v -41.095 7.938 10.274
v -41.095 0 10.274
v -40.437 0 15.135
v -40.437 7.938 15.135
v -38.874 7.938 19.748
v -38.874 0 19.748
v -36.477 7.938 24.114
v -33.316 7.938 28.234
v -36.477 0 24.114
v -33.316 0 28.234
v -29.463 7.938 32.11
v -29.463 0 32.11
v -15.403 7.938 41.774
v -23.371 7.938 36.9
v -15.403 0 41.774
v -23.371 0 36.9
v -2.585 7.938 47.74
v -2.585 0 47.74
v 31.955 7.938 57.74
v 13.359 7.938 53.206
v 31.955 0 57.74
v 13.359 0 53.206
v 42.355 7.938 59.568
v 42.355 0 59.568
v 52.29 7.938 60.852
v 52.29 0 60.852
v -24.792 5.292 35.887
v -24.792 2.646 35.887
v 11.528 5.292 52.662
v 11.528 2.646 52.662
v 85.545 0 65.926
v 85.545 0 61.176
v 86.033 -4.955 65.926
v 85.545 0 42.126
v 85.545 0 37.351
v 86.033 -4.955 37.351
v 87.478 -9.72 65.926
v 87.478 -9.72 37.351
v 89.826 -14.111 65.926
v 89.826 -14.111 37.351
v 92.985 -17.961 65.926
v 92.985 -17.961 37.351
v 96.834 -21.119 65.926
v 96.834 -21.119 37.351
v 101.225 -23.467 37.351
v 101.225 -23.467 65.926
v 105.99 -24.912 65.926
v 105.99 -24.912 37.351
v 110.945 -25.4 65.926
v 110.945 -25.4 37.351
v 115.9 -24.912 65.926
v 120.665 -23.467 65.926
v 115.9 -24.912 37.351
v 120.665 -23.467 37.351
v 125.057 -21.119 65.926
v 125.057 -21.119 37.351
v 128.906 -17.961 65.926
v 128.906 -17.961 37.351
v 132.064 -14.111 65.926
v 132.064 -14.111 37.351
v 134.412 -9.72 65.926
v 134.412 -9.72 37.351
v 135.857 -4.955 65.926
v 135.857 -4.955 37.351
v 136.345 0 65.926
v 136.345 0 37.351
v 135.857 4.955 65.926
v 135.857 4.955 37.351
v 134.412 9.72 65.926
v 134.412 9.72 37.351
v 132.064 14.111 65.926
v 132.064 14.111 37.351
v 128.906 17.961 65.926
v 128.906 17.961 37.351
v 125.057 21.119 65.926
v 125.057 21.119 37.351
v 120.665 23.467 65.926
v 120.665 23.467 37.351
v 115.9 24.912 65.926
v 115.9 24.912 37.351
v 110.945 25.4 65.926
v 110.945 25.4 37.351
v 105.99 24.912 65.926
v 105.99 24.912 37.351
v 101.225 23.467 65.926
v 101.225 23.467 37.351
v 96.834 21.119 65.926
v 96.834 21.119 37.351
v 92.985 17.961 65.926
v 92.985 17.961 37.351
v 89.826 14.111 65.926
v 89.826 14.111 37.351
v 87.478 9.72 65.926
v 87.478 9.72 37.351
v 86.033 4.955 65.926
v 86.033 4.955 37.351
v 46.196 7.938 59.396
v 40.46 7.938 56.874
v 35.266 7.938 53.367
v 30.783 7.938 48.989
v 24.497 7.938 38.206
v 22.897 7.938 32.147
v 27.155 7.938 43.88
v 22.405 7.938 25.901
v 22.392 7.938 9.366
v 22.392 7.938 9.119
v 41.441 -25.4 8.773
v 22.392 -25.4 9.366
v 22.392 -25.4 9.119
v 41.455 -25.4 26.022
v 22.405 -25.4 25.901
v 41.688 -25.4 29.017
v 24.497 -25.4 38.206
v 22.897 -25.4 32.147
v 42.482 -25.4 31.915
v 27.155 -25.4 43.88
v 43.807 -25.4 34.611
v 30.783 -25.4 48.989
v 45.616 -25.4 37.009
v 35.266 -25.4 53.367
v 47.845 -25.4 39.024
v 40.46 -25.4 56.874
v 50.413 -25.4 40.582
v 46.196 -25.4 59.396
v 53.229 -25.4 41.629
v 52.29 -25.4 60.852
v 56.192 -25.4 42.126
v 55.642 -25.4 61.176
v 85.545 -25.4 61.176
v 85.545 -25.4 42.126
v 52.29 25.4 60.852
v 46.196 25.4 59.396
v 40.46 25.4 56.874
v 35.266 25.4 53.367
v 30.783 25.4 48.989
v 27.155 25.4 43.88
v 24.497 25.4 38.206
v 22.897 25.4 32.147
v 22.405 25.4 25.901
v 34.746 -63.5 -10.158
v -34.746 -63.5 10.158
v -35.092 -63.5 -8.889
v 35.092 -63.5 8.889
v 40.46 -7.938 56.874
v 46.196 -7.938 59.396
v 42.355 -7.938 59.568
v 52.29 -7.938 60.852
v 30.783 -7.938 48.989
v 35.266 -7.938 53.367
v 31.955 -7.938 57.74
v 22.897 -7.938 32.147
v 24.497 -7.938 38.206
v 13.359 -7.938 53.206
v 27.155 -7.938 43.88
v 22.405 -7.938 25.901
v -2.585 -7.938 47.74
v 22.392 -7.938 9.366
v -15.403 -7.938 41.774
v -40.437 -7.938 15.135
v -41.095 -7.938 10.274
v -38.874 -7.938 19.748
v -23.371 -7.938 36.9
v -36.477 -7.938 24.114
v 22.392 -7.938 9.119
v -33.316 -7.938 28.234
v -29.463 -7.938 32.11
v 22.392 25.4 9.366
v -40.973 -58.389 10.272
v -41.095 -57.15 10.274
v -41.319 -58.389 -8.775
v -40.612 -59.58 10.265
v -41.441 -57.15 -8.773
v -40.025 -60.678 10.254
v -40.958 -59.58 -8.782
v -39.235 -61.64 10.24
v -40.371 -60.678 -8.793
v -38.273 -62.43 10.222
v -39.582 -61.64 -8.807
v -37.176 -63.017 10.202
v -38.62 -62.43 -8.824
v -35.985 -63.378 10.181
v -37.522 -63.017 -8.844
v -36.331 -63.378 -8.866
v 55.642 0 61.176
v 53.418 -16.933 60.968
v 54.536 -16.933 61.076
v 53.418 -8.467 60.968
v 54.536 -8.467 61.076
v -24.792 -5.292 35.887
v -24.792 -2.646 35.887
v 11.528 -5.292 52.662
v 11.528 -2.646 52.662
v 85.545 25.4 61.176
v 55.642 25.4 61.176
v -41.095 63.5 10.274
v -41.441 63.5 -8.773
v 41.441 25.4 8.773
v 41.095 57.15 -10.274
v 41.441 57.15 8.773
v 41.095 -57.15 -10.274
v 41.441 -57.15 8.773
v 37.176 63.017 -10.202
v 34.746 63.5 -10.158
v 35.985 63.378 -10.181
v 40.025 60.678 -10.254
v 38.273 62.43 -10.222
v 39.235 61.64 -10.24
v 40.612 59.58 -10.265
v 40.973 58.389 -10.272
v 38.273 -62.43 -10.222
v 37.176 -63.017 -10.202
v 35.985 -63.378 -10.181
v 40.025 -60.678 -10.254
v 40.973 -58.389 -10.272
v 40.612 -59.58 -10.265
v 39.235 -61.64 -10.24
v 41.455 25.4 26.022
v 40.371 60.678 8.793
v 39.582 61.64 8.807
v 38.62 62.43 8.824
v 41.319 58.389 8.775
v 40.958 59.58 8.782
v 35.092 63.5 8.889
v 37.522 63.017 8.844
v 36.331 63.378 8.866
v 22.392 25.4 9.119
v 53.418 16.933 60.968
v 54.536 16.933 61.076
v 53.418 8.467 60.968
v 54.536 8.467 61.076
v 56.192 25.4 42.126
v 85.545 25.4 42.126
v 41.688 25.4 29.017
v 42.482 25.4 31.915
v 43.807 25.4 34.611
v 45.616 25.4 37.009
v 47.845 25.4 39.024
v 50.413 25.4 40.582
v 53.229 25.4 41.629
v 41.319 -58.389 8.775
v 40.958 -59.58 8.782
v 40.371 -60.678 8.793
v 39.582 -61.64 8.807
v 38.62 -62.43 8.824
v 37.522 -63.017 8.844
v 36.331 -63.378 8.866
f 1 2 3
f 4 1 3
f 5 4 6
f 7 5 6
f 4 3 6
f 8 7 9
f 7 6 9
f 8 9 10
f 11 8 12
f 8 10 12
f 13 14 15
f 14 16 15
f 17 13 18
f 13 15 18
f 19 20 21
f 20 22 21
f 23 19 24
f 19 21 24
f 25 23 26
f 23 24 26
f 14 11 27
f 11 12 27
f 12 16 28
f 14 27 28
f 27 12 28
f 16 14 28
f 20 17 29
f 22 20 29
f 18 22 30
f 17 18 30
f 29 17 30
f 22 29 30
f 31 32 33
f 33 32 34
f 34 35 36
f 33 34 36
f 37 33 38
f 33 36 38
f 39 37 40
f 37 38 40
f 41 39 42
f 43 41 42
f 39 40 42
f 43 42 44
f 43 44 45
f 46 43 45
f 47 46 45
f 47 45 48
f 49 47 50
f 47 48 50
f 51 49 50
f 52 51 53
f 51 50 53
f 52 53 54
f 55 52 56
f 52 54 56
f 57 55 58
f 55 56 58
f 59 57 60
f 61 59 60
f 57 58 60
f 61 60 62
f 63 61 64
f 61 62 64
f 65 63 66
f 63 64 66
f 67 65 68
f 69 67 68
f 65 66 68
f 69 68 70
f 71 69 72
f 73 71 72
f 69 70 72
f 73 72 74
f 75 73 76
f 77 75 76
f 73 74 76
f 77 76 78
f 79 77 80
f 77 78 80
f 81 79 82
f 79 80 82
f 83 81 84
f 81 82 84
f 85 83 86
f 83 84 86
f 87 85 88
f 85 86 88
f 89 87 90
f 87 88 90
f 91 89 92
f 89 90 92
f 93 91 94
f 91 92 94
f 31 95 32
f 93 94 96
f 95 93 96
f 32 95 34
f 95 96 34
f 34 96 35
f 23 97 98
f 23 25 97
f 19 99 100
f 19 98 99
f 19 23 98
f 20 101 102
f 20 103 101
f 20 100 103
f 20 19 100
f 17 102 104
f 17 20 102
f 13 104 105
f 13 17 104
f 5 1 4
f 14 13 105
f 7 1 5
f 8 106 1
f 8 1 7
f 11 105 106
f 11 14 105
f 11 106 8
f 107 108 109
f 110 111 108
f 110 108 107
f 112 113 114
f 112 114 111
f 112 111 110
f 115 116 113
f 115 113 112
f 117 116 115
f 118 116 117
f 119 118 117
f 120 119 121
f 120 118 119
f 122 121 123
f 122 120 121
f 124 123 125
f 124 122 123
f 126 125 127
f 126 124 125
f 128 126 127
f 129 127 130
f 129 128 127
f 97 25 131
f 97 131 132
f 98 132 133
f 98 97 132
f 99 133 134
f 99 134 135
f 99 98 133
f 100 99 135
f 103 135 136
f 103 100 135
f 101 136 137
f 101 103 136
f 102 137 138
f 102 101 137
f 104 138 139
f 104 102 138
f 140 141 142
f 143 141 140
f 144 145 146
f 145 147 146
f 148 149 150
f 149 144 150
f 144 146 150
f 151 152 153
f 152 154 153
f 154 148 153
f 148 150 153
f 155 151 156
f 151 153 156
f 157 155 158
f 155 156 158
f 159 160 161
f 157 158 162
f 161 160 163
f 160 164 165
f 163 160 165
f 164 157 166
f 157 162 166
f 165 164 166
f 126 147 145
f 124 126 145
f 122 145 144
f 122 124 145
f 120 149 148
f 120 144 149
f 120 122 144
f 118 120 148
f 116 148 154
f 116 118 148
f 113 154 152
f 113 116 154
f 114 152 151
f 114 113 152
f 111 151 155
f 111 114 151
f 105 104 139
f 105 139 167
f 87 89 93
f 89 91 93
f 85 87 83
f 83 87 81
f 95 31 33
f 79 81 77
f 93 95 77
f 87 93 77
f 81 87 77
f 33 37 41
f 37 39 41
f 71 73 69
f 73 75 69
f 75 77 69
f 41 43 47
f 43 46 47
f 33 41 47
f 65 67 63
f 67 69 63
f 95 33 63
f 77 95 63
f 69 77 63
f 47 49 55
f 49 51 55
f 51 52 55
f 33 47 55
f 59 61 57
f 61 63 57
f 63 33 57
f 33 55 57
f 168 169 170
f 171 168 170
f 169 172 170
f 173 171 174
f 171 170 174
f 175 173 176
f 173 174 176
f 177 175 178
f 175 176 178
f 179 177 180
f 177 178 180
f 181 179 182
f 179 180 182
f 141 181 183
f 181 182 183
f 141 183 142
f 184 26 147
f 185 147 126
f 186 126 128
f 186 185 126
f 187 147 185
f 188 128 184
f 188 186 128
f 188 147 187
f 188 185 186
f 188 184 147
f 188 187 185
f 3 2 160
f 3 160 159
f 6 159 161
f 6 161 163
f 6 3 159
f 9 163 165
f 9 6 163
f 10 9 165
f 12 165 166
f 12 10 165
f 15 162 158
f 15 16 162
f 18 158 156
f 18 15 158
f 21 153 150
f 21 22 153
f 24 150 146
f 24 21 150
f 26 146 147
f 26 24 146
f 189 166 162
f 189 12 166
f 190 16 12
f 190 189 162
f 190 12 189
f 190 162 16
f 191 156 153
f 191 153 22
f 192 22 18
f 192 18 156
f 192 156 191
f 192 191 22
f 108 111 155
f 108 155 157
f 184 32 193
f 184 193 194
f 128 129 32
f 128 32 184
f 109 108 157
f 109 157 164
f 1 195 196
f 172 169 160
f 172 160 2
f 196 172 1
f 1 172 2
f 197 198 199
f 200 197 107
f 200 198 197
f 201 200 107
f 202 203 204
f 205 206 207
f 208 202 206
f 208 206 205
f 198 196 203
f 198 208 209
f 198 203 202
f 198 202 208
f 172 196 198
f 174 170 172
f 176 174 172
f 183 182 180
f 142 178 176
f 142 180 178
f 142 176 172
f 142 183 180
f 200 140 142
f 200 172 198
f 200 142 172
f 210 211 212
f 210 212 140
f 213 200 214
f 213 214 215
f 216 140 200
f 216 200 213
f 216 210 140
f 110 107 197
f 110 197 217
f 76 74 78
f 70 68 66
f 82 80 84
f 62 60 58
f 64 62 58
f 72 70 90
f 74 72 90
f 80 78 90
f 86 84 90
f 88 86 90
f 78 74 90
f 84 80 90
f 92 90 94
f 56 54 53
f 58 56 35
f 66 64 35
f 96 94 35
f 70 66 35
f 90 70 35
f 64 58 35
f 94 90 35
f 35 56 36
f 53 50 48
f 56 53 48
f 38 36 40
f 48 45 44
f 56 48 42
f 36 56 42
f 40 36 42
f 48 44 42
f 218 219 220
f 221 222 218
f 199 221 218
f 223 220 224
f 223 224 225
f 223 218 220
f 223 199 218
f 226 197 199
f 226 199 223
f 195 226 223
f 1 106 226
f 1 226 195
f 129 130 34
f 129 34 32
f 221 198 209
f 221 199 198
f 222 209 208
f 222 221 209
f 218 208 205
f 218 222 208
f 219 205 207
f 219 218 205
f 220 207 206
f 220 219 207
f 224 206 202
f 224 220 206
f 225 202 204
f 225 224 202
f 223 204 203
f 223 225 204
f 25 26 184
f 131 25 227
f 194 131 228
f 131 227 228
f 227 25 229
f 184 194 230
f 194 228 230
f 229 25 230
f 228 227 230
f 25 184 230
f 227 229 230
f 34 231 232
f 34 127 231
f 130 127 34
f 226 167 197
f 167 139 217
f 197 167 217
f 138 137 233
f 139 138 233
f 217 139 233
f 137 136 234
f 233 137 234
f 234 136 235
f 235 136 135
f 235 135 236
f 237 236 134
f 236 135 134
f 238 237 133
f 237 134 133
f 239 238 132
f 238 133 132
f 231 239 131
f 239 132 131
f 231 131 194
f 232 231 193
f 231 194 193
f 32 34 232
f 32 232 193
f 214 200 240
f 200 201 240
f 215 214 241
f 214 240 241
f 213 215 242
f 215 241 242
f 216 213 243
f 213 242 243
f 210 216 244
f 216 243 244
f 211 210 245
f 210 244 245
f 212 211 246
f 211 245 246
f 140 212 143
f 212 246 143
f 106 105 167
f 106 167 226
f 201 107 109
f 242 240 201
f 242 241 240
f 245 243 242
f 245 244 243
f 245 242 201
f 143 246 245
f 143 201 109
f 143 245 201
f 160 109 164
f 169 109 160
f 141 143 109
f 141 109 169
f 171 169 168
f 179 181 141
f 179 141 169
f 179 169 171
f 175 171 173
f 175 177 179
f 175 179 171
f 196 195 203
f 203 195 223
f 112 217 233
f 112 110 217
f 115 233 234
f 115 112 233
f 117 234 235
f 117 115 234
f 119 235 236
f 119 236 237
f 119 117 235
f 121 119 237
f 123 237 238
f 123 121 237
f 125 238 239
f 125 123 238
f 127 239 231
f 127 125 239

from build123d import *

# Parameters (mm, degrees)
F1_DEPTH = 63.5
F0_W     = 25.4
F0_H     = 19.05
F2_DEPTH = 25.4
F3_DEPTH = 7.9375
F5_R     = 6.35


with BuildPart() as f1:
    # F0 (on Front) → F1 (new body, symmetric)
    with BuildSketch(Plane.XZ):
        Polygon((-41.4413325772, -8.7730954759), (41.0950261768, -10.2737565442), (41.4413325772, 8.7730954759), (22.3917926016, 9.1194507482), (-41.0950261768, 10.2737565442), align=None)
    extrude(amount=F1_DEPTH, both=True)

    # F0 (on Front) → F2 (join, symmetric)
    with BuildSketch(Plane.XZ):
        with Locations((72.8450261768, 51.6514434558)):
            Rectangle(F0_W, F0_H)
        with BuildLine():
            Line((22.3917926016, 9.1194507482), (41.4413325772, 8.7730954759))
            Line((41.4413325772, 8.7730954759), (41.4548975004, 26.0220651349))
            ThreePointArc((41.4548975004, 26.0220651349), (45.6161013981, 37.0092284112), (56.1918985276, 42.1264434558))
            Line((56.1918985276, 42.1264434558), (60.1450261768, 42.1264434558))
            Line((60.1450261768, 42.1264434558), (60.1450261768, 61.1764434558))
            Line((60.1450261768, 61.1764434558), (55.6424930992, 61.1764434558))
            add(Edge.make_bspline(
                [(52.2903132823, 60.8519427515), (53.4233481984, 60.971333396), (54.5413711132, 61.0794900705), (55.6424930992, 61.1764434558)],
                knots=[106.1306028358, 106.1306028358, 106.1306028358, 106.1306028358, 109.3125389445, 109.3125389445, 109.3125389445, 109.3125389445], degree=3))
            ThreePointArc((52.2903132823, 60.8519427515), (30.7832414406, 48.9890939254), (22.4047960117, 25.9005042398))
            Line((22.4047960117, 25.9005042398), (22.3917926016, 9.3655468447))
            Line((22.3917926016, 9.3655468447), (22.3917926016, 9.1194507482))
        make_face()
    extrude(amount=F2_DEPTH, both=True)

    # F0 (on Front) → F3 (join, symmetric)
    with BuildSketch(Plane.XZ):
        with BuildLine():
            add(Edge.make_bspline(
                [(-41.0950261768, 10.2737565442), (-39.9931851402, 40.3898650296), (14.4989577746, 56.8697757186), (52.2903132823, 60.8519427515)],
                knots=[0, 0, 0, 0, 106.1306028358, 106.1306028358, 106.1306028358, 106.1306028358], degree=3))
            Line((-41.0950261768, 10.2737565442), (22.3917926016, 9.1194507482))
            Line((22.3917926016, 9.1194507482), (22.3917926016, 9.3655468447))
            Line((22.3917926016, 9.3655468447), (22.4047960117, 25.9005042398))
            ThreePointArc((22.4047960117, 25.9005042398), (30.7832414406, 48.9890939254), (52.2903132823, 60.8519427515))
        make_face()
    extrude(amount=F3_DEPTH, both=True)

    # F0 (on Front) → F4 (revolve)
    with BuildSketch(Plane.XZ):
        Polygon((85.5450261768, 61.1764434558), (85.5450261768, 42.1264434558), (85.5450261768, 37.3512434558), (110.9450261768, 37.3512434558), (110.9450261768, 65.9262434558), (85.5450261768, 65.9262434558), align=None)
    revolve(axis=Axis((110.9450261768, 0, 51.6387434558), (0, 0, 1)))

    # F5
    f5_edges = [f1.edges().sort_by_distance(p)[0] for p in [
        (41.268179, -63.5, -0.750331),
        (-41.268179, -63.5, 0.750331),
        (41.268179, 63.5, -0.750331),
    ]]
    fillet(f5_edges, radius=F5_R)


solid = f1.part
